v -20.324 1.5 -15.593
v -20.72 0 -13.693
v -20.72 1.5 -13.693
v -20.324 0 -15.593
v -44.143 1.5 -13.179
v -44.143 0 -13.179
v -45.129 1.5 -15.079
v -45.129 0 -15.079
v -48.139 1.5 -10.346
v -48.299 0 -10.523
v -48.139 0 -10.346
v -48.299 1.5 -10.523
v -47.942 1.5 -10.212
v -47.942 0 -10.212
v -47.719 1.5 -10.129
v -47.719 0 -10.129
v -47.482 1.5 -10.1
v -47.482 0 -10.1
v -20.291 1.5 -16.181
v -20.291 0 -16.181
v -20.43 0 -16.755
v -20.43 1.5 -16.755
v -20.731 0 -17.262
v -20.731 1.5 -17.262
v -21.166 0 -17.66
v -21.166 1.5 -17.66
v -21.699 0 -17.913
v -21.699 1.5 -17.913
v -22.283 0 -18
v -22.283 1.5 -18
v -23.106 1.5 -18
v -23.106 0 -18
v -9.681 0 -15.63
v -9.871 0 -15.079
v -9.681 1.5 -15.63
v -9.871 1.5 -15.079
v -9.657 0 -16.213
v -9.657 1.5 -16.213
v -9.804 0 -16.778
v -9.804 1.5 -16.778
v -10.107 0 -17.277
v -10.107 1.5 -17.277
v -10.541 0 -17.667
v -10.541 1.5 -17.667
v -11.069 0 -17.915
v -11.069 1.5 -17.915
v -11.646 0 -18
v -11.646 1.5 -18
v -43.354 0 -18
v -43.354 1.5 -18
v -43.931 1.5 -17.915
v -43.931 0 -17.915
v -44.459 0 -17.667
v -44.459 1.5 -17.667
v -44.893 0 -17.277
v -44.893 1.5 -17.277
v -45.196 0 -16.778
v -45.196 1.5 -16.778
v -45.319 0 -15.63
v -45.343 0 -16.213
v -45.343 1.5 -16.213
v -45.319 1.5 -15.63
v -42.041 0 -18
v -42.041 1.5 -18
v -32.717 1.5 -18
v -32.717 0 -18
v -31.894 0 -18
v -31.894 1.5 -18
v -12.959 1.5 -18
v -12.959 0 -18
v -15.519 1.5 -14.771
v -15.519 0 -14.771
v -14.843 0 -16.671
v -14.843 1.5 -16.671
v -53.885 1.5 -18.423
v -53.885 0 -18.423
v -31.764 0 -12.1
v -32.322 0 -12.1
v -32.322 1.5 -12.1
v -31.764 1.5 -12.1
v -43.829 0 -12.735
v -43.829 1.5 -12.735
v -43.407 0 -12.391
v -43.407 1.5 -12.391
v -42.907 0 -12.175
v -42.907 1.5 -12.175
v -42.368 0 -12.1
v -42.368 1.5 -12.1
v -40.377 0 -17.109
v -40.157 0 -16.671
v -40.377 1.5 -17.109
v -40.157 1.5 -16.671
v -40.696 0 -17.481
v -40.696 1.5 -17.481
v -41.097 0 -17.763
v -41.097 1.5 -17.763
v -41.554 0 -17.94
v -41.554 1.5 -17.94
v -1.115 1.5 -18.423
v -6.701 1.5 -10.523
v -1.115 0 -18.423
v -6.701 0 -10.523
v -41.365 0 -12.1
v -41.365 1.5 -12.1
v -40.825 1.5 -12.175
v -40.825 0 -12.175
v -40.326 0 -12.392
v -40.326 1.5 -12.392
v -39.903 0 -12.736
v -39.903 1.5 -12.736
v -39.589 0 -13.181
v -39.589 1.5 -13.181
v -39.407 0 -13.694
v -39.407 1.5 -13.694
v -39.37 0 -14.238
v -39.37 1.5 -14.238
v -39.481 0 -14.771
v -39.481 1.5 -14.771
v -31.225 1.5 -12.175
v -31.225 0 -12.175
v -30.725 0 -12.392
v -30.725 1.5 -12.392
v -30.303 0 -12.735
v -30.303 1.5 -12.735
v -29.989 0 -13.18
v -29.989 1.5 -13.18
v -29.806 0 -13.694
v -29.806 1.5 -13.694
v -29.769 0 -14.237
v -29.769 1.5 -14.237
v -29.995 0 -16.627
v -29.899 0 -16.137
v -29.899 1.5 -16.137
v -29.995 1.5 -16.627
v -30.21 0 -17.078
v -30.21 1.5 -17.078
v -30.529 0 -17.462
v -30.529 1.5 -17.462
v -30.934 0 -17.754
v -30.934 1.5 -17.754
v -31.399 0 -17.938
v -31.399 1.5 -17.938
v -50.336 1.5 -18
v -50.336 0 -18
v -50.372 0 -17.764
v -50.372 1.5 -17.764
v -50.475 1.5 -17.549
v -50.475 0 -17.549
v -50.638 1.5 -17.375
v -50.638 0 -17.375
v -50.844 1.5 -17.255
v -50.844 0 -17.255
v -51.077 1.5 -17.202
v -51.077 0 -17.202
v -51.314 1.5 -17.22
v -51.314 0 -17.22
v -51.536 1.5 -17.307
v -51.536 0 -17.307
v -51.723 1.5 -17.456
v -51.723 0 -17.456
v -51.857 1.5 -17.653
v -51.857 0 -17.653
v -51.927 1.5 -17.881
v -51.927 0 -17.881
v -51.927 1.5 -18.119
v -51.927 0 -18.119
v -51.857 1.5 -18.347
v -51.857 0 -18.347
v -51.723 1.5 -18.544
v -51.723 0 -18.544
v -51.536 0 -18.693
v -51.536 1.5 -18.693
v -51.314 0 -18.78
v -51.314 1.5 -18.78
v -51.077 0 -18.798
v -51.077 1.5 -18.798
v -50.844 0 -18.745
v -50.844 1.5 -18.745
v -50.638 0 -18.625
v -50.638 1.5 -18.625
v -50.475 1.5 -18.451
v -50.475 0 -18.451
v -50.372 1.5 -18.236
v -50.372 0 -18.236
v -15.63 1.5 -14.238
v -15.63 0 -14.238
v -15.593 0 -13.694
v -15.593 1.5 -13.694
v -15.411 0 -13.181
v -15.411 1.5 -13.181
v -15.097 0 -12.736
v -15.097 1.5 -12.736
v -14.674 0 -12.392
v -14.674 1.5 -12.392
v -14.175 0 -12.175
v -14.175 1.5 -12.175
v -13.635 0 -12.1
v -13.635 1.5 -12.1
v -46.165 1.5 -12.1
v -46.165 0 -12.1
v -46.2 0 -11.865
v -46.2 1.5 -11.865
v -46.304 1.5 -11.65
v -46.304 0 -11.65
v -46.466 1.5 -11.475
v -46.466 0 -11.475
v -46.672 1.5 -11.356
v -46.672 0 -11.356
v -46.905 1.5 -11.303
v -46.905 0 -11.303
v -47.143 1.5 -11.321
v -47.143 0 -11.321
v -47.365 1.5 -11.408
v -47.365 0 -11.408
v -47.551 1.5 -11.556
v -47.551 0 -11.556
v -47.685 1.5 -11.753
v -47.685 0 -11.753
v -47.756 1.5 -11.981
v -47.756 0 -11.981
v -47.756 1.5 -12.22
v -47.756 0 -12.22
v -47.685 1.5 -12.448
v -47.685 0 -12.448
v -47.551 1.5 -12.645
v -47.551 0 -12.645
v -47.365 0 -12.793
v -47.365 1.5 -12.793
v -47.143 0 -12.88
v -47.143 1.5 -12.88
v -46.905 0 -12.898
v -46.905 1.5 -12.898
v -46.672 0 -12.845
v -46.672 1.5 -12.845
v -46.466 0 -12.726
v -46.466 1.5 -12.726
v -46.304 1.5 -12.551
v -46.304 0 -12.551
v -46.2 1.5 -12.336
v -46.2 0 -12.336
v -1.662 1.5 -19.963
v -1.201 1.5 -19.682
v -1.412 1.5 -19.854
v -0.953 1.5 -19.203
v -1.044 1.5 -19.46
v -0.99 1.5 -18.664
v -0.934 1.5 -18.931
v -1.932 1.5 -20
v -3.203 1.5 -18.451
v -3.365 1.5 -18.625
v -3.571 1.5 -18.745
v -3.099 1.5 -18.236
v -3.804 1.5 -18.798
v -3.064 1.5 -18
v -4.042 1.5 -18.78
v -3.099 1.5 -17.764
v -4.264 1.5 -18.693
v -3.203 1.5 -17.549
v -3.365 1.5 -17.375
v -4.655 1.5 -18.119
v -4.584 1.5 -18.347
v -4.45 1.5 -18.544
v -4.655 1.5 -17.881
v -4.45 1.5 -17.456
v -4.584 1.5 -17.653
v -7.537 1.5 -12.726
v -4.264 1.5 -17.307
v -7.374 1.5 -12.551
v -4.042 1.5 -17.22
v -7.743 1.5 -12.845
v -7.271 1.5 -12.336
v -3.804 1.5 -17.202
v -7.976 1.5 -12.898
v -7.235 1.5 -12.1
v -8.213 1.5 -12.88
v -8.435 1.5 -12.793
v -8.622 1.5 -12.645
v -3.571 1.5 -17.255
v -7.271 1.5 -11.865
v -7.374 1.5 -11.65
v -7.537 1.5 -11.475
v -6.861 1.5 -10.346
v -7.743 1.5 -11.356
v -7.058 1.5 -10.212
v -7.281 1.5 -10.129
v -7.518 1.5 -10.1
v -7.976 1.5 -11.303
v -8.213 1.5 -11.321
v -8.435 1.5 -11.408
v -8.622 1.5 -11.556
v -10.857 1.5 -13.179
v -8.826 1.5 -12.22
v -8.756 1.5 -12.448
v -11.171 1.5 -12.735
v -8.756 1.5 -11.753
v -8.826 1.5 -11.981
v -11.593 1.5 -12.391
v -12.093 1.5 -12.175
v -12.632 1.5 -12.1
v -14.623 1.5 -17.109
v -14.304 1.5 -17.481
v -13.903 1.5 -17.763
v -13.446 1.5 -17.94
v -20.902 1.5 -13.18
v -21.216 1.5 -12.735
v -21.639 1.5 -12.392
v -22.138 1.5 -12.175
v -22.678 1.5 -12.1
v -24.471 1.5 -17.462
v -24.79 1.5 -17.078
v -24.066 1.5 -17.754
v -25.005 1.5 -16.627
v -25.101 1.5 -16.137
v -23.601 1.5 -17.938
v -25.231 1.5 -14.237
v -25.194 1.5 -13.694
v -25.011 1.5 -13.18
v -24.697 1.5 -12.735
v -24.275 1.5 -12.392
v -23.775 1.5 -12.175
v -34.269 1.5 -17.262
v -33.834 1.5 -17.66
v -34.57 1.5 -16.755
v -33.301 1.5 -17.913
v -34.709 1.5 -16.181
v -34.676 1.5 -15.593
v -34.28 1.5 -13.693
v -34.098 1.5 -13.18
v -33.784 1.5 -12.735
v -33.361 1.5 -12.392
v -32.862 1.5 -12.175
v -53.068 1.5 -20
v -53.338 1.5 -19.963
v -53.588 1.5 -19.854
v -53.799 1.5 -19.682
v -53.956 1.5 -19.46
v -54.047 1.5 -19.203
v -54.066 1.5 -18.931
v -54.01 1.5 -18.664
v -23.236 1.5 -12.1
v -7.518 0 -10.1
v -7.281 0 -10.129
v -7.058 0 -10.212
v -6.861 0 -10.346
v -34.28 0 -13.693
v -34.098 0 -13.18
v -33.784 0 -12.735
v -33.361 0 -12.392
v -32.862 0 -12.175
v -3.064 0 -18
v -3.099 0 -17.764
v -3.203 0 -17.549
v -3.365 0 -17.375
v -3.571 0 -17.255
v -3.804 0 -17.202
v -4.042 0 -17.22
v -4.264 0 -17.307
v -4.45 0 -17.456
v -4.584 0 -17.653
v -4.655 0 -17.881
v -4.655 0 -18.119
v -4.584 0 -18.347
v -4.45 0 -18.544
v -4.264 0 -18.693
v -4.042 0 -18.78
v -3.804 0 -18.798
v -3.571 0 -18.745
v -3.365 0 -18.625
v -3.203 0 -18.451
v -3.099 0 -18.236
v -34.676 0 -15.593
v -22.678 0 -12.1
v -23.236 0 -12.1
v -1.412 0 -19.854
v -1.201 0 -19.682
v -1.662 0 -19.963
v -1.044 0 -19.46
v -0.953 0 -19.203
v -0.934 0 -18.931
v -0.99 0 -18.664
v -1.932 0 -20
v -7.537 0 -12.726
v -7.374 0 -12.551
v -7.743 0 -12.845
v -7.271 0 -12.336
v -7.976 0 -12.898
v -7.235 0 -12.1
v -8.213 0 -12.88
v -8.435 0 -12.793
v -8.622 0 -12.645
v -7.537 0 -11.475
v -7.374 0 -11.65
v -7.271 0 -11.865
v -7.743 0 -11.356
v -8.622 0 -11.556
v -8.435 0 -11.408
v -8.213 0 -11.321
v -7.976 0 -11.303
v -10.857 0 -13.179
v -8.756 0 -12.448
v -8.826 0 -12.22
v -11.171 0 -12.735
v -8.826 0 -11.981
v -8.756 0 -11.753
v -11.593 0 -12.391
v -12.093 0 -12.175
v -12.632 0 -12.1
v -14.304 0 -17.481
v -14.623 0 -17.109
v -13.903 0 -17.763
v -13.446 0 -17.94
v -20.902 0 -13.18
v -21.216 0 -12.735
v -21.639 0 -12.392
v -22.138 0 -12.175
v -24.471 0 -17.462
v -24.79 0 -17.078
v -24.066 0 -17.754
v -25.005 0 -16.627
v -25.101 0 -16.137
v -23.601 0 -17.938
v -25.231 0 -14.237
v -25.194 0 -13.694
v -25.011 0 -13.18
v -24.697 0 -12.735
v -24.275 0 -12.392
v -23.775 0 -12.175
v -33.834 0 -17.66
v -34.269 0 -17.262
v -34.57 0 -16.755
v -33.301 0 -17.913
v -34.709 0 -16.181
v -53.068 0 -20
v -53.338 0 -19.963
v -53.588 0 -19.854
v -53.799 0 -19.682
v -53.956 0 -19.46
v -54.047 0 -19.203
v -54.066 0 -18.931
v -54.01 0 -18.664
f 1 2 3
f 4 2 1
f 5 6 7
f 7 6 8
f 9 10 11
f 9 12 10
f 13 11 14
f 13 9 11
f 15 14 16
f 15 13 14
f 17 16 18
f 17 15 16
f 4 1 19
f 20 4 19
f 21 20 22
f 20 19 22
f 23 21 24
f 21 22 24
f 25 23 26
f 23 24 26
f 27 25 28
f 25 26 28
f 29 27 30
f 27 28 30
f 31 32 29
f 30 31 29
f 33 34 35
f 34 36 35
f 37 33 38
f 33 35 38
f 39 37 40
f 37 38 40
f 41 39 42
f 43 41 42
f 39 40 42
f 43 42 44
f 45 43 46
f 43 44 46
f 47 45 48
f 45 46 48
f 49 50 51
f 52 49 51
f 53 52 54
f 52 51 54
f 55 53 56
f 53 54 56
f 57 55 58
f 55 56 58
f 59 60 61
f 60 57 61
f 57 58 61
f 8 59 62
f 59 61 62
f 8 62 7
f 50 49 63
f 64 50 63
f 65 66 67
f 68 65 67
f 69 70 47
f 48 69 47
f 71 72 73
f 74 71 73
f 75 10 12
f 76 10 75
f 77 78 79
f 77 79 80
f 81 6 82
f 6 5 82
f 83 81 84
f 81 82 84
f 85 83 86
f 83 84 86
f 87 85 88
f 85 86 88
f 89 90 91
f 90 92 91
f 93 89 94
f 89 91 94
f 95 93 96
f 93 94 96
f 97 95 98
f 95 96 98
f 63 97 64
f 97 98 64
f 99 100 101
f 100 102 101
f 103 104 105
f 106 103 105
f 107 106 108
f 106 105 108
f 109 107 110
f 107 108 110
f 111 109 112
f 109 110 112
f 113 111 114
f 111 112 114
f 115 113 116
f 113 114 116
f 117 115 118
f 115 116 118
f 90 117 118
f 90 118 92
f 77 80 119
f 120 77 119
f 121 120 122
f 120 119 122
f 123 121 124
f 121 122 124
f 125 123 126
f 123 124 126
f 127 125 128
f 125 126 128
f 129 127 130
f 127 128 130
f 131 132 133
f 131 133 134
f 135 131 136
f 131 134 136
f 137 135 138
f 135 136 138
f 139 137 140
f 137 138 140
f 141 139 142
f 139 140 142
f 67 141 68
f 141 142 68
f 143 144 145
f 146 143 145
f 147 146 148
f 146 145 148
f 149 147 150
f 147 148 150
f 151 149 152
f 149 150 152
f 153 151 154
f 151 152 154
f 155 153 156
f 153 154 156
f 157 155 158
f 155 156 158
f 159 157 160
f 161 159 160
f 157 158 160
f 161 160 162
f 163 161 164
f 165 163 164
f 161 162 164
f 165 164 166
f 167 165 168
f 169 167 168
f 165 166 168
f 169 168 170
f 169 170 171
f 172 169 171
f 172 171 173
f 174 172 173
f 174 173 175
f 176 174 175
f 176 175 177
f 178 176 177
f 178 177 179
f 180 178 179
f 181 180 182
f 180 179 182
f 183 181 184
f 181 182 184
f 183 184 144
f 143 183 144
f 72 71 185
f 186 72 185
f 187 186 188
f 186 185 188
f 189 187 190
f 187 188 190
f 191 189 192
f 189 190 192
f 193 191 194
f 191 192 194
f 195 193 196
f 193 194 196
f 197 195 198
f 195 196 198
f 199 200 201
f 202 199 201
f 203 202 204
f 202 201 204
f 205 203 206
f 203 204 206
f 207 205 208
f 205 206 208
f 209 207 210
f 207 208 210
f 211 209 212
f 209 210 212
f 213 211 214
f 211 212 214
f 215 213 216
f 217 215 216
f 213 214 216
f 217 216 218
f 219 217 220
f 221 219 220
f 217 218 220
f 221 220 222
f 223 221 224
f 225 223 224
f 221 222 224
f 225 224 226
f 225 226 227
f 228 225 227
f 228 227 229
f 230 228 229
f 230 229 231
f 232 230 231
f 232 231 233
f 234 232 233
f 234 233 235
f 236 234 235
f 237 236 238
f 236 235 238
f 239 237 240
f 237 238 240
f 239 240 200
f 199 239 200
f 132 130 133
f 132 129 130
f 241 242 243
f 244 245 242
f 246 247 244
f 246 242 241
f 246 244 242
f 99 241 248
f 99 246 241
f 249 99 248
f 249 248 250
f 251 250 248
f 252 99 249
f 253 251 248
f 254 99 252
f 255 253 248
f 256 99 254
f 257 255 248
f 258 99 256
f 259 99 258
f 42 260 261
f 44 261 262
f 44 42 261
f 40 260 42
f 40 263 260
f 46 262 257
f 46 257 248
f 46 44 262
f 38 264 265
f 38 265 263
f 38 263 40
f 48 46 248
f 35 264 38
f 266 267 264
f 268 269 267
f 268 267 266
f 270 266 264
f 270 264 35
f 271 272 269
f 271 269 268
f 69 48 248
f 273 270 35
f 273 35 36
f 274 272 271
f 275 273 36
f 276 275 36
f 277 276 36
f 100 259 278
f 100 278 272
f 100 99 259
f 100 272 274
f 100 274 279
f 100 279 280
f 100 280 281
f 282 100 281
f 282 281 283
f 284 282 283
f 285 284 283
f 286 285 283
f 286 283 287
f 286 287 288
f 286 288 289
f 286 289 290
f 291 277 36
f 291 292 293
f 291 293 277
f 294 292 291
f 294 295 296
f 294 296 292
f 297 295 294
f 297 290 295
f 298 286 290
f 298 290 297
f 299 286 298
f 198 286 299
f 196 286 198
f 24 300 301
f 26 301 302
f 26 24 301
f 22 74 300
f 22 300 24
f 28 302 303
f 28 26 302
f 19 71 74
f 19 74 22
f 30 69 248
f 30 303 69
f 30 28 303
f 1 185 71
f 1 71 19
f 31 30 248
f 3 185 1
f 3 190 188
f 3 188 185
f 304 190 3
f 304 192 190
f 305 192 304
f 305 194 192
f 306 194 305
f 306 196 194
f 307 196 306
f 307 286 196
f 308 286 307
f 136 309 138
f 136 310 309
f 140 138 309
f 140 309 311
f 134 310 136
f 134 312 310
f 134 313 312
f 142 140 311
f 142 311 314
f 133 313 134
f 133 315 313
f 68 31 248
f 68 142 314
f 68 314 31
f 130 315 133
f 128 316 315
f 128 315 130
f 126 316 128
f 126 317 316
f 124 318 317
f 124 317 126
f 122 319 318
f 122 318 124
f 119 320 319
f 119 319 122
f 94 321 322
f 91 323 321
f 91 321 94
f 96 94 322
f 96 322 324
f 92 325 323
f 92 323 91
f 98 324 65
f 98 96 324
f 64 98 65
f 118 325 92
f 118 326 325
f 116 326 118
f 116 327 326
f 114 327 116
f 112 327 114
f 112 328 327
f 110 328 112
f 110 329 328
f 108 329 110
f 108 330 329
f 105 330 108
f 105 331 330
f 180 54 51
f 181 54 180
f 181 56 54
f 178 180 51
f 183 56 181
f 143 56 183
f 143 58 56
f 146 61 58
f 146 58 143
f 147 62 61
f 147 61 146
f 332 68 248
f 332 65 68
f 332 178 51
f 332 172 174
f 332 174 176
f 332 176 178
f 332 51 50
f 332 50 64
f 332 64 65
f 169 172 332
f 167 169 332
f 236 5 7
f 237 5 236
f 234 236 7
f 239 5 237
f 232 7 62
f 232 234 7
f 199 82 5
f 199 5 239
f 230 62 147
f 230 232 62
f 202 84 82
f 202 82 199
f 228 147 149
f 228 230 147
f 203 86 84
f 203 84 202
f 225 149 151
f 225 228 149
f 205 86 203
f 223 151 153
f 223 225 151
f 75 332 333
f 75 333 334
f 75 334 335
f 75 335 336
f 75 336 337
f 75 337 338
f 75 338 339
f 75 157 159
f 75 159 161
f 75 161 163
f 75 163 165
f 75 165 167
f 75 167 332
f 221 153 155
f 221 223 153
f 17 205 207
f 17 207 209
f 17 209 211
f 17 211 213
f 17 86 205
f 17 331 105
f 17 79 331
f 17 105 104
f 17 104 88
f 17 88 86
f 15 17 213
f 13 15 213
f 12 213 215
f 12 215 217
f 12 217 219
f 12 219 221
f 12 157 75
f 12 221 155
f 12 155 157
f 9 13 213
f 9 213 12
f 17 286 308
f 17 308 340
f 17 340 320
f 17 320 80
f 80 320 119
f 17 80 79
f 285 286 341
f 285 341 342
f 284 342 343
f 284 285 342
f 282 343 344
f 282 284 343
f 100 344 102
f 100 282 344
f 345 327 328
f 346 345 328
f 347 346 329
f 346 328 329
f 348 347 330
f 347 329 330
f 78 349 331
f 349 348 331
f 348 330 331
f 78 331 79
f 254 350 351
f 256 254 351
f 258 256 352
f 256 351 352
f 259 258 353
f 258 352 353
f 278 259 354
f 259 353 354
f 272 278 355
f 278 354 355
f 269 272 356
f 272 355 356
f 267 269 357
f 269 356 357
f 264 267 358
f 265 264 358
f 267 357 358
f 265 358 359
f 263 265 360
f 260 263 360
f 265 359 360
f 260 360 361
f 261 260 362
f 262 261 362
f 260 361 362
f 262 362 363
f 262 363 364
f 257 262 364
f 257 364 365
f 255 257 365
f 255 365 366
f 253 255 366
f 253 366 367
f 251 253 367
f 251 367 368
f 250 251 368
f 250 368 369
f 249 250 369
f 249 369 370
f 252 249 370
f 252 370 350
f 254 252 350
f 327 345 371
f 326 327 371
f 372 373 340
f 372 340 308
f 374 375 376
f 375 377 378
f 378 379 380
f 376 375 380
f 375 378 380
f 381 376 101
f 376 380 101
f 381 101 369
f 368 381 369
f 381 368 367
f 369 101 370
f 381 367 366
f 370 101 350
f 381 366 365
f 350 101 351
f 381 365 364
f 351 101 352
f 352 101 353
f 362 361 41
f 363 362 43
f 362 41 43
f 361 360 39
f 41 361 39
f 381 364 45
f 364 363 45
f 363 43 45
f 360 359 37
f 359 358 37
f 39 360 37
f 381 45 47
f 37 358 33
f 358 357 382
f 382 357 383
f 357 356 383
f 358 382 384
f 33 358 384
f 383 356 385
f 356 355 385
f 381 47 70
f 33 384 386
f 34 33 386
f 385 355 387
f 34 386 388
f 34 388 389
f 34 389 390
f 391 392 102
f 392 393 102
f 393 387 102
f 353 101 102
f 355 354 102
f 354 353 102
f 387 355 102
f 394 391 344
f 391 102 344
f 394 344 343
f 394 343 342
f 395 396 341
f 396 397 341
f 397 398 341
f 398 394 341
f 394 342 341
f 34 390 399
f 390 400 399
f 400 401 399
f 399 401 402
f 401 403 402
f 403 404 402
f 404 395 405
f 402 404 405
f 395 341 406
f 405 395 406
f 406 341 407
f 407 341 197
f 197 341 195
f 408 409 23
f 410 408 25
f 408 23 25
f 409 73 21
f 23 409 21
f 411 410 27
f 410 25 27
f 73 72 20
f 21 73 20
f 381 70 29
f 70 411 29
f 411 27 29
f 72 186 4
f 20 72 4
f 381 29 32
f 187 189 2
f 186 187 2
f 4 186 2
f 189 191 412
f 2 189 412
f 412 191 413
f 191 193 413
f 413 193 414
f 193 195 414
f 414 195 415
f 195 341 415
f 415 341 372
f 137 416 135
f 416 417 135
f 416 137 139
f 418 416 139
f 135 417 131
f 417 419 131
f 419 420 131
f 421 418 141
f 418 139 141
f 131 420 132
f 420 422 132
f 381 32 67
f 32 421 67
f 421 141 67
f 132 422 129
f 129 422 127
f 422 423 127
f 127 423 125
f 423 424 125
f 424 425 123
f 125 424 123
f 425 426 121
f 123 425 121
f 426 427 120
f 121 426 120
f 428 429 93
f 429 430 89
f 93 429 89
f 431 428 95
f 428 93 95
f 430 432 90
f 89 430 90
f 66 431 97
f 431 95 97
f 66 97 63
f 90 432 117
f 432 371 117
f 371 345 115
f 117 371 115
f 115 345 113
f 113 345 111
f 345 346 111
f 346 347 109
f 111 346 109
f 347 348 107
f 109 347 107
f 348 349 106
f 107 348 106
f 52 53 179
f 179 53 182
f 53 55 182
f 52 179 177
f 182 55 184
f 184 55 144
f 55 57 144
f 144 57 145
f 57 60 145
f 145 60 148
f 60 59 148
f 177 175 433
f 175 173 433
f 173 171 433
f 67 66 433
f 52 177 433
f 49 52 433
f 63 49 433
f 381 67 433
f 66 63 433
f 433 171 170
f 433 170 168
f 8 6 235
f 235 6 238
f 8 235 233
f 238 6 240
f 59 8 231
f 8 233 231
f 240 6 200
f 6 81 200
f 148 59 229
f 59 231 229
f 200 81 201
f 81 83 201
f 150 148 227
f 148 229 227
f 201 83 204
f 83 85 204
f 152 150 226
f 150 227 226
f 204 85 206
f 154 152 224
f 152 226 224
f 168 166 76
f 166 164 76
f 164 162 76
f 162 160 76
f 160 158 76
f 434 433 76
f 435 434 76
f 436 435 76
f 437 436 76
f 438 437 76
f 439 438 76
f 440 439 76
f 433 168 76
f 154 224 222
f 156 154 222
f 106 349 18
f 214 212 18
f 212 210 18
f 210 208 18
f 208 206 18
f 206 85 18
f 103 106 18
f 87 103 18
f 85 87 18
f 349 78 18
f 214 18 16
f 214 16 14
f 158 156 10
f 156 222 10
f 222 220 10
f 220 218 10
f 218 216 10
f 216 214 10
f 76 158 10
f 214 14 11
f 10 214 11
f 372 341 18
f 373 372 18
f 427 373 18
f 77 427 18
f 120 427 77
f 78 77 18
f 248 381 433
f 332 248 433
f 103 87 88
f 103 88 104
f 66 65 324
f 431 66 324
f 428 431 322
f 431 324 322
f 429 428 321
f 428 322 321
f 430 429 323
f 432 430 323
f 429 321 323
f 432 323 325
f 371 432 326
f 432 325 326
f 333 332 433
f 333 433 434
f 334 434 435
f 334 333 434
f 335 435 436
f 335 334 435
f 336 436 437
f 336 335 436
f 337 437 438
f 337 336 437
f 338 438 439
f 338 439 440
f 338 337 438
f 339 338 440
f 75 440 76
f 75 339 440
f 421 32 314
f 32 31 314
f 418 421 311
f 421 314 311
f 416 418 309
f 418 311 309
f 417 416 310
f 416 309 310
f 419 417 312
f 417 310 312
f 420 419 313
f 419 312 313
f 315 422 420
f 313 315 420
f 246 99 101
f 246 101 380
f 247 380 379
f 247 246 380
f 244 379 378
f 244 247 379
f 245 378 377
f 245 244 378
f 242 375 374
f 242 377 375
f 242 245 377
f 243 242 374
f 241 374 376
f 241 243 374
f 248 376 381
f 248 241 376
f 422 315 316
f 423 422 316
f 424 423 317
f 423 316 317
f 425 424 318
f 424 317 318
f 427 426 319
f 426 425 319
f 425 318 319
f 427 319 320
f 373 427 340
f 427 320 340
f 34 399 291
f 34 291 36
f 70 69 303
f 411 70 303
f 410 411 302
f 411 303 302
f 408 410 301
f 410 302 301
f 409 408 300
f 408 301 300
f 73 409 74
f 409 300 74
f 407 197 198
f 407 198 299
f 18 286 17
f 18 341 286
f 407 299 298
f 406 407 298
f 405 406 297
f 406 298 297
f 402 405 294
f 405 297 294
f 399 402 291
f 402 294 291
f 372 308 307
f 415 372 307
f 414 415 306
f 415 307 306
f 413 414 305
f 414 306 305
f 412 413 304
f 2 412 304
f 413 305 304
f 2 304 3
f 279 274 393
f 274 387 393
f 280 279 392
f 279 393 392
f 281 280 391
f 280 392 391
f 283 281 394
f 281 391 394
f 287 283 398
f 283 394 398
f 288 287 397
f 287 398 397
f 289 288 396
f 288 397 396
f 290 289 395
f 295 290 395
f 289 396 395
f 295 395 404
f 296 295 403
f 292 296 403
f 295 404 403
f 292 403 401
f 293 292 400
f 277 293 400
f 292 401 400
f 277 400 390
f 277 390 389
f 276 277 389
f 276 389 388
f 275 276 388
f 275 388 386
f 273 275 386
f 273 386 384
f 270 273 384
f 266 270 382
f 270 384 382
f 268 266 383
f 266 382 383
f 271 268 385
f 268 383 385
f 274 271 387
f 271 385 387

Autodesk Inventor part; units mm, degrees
ref_plane "YZ Plane" through (0, 0, 0) normal (1, 0, 0) x (0, 1, 0)
ref_plane "XZ Plane" through (0, 0, 0) normal (0, 1, 0) x (-1, 0, 0)
ref_plane "XY Plane" through (0, 0, 0) normal (0, 0, 1) x (1, 0, 0)
sketch "スケッチ1" plane through (0, 0, 0) normal (0, 1, 0) x (-1, 0, 0)
  line L0 (55, 0) -> (0, 0)
  line L1 (0, 0) -> (0, -20)
  line L2 (0, -20) -> (55, -20)
  line L3 (55, -20) -> (55, 0)
  dimension "d0" = 20
  dimension "d1" = 55
extrude "押し出し1" add sketch "スケッチ1" along normal blind 1.5
sketch "スケッチ2" plane through (0, 0, 0) normal (0, -1, 0) x (1, 0, 0)
  line L0 (-7, -10.1005) -> (0, -20) projected
  line L1 (-7, -10.1005) -> (-48, -10.1005) projected
  line L2 (0, -20) -> (-55, -20) projected
  line L3 (-48, -10.1005) -> (-55, -20) projected
  line L4 (0, 0) -> (0, -20) projected
  line L5 (-55, 0) -> (0, 0) projected
  line L6 (-55, -20) -> (-55, 0) projected
  line L7 (0, -20) -> (-55, -20) projected
  point P0 (0, -20)
extrude "押し出し2" cut sketch "スケッチ2" against normal through all contours L1 L3 L6 L5 L4 L0
fillet "フィレット1" radius 1 4 edges at (-7, 0.75, -10.1005) (0, 0.75, -20) (-48, 0.75, -10.1005) (-55, 0.75, -20)
sketch "スケッチ3" plane through (0, 0, 0) normal (0, -1, 0) x (1, 0, 0)
  arc A0 (-53.8846, -18.4226) -> (-53.0681, -20) centre (-53.0681, -19) ccw projected
  line L0 (-1.9319, -20) -> (-53.0681, -20) projected
  arc A1 (-1.9319, -20) -> (-1.1154, -18.4226) centre (-1.9319, -19) ccw projected
  line L1 (-1.1154, -18.4226) -> (-6.7011, -10.5232) projected
  arc A2 (-6.7011, -10.5232) -> (-7.5176, -10.1005) centre (-7.5176, -11.1005) ccw projected
  line L2 (-7.5176, -10.1005) -> (-47.4824, -10.1005) projected
  arc A3 (-47.4824, -10.1005) -> (-48.2989, -10.5232) centre (-47.4824, -11.1005) ccw projected
  line L3 (-48.2989, -10.5232) -> (-53.8846, -18.4226) projected
  circle A4 centre (-46.9647, -12.1005) radius 0.8
  circle A5 centre (-8.0353, -12.1005) radius 0.8
  circle A6 centre (-3.8637, -18) radius 0.8
  circle A7 centre (-51.1363, -18) radius 0.8
  circle A8 centre (-27.5, 18.8909) radius 46.7105
  line L4 (-27.5, 18.8909) -> (-54.4683, -19.2481)
  line L5 (-27.5, 18.8909) -> (-0.5317, -19.2481)
  arc A9 (-53.8846, -18.4226) -> (-53.0681, -20) centre (-53.0681, -19) ccw projected
  line L6 (-27.5, 18.8909) -> (-49.0163, -22.569)
  line L7 (-27.5, 18.8909) -> (-43.1624, -25.1155)
  line L8 (-27.5, 18.8909) -> (-37.016, -26.84)
  line L9 (-27.5, 18.8909) -> (-30.6919, -27.7104)
  line L10 (-27.5, 18.8909) -> (-24.3081, -27.7104)
  line L11 (-27.5, 18.8909) -> (-17.984, -26.84)
  line L12 (-27.5, 18.8909) -> (-11.8376, -25.1155)
  line L13 (-27.5, 18.8909) -> (-5.9837, -22.569)
  line L14 (-46.9647, -12.1005) -> (-8.0353, -12.1005)
  line L15 (-51.1363, -18) -> (-3.8637, -18)
  line L16 (-46.9647, -12.1005) -> (-51.1363, -18)
  line L17 (-8.0353, -12.1005) -> (-3.8637, -18)
  circle A10 centre (-46.9647, -12.1005) radius 3.0011
  circle A11 centre (-51.1363, -18) radius 3.9863
  circle A12 centre (-8.0353, -12.1005) radius 3.0011
  circle A13 centre (-3.8637, -18) radius 3.9863
  line L18 (-43.5835, -12.1005) -> (-38.5302, -12.1005)
  point P0 (0, 0)
  point P1 (-14.37, -18)
  point P2 (-8.3548, -18)
  point P3 (-11.4165, -12.1005)
  point P4 (-16.4698, -12.1005)
  point P5 (-24.9732, -18)
  point P6 (-19.8235, -18)
  point P7 (-21.0511, -12.1005)
  point P8 (-25.3773, -12.1005)
  point P9 (-35.1765, -18)
  point P10 (-30.0268, -18)
  point P11 (-29.6227, -12.1005)
  point P12 (-33.9489, -12.1005)
  point P13 (-46.6452, -18)
  point P14 (-40.63, -18)
  dimension "d7" = 1.6
  dimension "d8" = 1.6
  dimension "d9" = 1.6
  dimension "d10" = 1.6
  dimension "d11" = 2
  dimension "d12" = 2
  dimension "d13" = 2
  dimension "d14" = 2
  dimension "d15" = 2
  dimension "d16" = 2
  dimension "d19" = 7.837
  dimension "d20" = 7.837
  dimension "d21" = 7.837
  dimension "d22" = 7.837
  dimension "d25" = 7.837
  dimension "d26" = 7.837
  dimension "d27" = 7.837
  dimension "d28" = 7.837
  dimension "d29" = 7.837
extrude "押し出し3" cut sketch "スケッチ3" against normal through all contours L16 L15 A7 | A7 L15 L16 | L16 L14 A4 | A4 L14 L16 | L6 L14 L7 L15 | L8 L14 L9 L15 | L14 L11 L15 L10 | L14 L13 L15 L12 | L14 L17 A5 | A5 L17 L14 | L17 L15 A6 | A6 L15 L17
fillet "フィレット2" radius 2 16 edges at (-43.5835, 0.75, -12.1005) (-38.5302, 0.75, -12.1005) (-46.6452, 0.75, -18) (-40.63, 0.75, -18) (-33.9489, 0.75, -12.1005) (-29.6227, 0.75, -12.1005) (-35.1765, 0.75, -18) (-30.0268, 0.75, -18) (-24.9732, 0.75, -18) (-25.3773, 0.75, -12.1005) (-21.0511, 0.75, -12.1005) (-19.8235, 0.75, -18) (-11.4165, 0.75, -12.1005) (-8.3548, 0.75, -18) (-14.37, 0.75, -18) (-16.4698, 0.75, -12.1005)
equation "\"d12\" = d11"
equation "\"d13\" = d11"
equation "\"d14\" = d11"
equation "\"d15\" = d11"
equation "\"d16\" = d11"
equation "\"d19\" = d29"
equation "\"d20\" = d19"
equation "\"d21\" = d19"
equation "\"d22\" = d19"
equation "\"d25\" = d19"
equation "\"d26\" = d19"
equation "\"d27\" = d19"
equation "\"d28\" = d19"
properties part number "shield_side_side" material "アルミニウム 6061"
